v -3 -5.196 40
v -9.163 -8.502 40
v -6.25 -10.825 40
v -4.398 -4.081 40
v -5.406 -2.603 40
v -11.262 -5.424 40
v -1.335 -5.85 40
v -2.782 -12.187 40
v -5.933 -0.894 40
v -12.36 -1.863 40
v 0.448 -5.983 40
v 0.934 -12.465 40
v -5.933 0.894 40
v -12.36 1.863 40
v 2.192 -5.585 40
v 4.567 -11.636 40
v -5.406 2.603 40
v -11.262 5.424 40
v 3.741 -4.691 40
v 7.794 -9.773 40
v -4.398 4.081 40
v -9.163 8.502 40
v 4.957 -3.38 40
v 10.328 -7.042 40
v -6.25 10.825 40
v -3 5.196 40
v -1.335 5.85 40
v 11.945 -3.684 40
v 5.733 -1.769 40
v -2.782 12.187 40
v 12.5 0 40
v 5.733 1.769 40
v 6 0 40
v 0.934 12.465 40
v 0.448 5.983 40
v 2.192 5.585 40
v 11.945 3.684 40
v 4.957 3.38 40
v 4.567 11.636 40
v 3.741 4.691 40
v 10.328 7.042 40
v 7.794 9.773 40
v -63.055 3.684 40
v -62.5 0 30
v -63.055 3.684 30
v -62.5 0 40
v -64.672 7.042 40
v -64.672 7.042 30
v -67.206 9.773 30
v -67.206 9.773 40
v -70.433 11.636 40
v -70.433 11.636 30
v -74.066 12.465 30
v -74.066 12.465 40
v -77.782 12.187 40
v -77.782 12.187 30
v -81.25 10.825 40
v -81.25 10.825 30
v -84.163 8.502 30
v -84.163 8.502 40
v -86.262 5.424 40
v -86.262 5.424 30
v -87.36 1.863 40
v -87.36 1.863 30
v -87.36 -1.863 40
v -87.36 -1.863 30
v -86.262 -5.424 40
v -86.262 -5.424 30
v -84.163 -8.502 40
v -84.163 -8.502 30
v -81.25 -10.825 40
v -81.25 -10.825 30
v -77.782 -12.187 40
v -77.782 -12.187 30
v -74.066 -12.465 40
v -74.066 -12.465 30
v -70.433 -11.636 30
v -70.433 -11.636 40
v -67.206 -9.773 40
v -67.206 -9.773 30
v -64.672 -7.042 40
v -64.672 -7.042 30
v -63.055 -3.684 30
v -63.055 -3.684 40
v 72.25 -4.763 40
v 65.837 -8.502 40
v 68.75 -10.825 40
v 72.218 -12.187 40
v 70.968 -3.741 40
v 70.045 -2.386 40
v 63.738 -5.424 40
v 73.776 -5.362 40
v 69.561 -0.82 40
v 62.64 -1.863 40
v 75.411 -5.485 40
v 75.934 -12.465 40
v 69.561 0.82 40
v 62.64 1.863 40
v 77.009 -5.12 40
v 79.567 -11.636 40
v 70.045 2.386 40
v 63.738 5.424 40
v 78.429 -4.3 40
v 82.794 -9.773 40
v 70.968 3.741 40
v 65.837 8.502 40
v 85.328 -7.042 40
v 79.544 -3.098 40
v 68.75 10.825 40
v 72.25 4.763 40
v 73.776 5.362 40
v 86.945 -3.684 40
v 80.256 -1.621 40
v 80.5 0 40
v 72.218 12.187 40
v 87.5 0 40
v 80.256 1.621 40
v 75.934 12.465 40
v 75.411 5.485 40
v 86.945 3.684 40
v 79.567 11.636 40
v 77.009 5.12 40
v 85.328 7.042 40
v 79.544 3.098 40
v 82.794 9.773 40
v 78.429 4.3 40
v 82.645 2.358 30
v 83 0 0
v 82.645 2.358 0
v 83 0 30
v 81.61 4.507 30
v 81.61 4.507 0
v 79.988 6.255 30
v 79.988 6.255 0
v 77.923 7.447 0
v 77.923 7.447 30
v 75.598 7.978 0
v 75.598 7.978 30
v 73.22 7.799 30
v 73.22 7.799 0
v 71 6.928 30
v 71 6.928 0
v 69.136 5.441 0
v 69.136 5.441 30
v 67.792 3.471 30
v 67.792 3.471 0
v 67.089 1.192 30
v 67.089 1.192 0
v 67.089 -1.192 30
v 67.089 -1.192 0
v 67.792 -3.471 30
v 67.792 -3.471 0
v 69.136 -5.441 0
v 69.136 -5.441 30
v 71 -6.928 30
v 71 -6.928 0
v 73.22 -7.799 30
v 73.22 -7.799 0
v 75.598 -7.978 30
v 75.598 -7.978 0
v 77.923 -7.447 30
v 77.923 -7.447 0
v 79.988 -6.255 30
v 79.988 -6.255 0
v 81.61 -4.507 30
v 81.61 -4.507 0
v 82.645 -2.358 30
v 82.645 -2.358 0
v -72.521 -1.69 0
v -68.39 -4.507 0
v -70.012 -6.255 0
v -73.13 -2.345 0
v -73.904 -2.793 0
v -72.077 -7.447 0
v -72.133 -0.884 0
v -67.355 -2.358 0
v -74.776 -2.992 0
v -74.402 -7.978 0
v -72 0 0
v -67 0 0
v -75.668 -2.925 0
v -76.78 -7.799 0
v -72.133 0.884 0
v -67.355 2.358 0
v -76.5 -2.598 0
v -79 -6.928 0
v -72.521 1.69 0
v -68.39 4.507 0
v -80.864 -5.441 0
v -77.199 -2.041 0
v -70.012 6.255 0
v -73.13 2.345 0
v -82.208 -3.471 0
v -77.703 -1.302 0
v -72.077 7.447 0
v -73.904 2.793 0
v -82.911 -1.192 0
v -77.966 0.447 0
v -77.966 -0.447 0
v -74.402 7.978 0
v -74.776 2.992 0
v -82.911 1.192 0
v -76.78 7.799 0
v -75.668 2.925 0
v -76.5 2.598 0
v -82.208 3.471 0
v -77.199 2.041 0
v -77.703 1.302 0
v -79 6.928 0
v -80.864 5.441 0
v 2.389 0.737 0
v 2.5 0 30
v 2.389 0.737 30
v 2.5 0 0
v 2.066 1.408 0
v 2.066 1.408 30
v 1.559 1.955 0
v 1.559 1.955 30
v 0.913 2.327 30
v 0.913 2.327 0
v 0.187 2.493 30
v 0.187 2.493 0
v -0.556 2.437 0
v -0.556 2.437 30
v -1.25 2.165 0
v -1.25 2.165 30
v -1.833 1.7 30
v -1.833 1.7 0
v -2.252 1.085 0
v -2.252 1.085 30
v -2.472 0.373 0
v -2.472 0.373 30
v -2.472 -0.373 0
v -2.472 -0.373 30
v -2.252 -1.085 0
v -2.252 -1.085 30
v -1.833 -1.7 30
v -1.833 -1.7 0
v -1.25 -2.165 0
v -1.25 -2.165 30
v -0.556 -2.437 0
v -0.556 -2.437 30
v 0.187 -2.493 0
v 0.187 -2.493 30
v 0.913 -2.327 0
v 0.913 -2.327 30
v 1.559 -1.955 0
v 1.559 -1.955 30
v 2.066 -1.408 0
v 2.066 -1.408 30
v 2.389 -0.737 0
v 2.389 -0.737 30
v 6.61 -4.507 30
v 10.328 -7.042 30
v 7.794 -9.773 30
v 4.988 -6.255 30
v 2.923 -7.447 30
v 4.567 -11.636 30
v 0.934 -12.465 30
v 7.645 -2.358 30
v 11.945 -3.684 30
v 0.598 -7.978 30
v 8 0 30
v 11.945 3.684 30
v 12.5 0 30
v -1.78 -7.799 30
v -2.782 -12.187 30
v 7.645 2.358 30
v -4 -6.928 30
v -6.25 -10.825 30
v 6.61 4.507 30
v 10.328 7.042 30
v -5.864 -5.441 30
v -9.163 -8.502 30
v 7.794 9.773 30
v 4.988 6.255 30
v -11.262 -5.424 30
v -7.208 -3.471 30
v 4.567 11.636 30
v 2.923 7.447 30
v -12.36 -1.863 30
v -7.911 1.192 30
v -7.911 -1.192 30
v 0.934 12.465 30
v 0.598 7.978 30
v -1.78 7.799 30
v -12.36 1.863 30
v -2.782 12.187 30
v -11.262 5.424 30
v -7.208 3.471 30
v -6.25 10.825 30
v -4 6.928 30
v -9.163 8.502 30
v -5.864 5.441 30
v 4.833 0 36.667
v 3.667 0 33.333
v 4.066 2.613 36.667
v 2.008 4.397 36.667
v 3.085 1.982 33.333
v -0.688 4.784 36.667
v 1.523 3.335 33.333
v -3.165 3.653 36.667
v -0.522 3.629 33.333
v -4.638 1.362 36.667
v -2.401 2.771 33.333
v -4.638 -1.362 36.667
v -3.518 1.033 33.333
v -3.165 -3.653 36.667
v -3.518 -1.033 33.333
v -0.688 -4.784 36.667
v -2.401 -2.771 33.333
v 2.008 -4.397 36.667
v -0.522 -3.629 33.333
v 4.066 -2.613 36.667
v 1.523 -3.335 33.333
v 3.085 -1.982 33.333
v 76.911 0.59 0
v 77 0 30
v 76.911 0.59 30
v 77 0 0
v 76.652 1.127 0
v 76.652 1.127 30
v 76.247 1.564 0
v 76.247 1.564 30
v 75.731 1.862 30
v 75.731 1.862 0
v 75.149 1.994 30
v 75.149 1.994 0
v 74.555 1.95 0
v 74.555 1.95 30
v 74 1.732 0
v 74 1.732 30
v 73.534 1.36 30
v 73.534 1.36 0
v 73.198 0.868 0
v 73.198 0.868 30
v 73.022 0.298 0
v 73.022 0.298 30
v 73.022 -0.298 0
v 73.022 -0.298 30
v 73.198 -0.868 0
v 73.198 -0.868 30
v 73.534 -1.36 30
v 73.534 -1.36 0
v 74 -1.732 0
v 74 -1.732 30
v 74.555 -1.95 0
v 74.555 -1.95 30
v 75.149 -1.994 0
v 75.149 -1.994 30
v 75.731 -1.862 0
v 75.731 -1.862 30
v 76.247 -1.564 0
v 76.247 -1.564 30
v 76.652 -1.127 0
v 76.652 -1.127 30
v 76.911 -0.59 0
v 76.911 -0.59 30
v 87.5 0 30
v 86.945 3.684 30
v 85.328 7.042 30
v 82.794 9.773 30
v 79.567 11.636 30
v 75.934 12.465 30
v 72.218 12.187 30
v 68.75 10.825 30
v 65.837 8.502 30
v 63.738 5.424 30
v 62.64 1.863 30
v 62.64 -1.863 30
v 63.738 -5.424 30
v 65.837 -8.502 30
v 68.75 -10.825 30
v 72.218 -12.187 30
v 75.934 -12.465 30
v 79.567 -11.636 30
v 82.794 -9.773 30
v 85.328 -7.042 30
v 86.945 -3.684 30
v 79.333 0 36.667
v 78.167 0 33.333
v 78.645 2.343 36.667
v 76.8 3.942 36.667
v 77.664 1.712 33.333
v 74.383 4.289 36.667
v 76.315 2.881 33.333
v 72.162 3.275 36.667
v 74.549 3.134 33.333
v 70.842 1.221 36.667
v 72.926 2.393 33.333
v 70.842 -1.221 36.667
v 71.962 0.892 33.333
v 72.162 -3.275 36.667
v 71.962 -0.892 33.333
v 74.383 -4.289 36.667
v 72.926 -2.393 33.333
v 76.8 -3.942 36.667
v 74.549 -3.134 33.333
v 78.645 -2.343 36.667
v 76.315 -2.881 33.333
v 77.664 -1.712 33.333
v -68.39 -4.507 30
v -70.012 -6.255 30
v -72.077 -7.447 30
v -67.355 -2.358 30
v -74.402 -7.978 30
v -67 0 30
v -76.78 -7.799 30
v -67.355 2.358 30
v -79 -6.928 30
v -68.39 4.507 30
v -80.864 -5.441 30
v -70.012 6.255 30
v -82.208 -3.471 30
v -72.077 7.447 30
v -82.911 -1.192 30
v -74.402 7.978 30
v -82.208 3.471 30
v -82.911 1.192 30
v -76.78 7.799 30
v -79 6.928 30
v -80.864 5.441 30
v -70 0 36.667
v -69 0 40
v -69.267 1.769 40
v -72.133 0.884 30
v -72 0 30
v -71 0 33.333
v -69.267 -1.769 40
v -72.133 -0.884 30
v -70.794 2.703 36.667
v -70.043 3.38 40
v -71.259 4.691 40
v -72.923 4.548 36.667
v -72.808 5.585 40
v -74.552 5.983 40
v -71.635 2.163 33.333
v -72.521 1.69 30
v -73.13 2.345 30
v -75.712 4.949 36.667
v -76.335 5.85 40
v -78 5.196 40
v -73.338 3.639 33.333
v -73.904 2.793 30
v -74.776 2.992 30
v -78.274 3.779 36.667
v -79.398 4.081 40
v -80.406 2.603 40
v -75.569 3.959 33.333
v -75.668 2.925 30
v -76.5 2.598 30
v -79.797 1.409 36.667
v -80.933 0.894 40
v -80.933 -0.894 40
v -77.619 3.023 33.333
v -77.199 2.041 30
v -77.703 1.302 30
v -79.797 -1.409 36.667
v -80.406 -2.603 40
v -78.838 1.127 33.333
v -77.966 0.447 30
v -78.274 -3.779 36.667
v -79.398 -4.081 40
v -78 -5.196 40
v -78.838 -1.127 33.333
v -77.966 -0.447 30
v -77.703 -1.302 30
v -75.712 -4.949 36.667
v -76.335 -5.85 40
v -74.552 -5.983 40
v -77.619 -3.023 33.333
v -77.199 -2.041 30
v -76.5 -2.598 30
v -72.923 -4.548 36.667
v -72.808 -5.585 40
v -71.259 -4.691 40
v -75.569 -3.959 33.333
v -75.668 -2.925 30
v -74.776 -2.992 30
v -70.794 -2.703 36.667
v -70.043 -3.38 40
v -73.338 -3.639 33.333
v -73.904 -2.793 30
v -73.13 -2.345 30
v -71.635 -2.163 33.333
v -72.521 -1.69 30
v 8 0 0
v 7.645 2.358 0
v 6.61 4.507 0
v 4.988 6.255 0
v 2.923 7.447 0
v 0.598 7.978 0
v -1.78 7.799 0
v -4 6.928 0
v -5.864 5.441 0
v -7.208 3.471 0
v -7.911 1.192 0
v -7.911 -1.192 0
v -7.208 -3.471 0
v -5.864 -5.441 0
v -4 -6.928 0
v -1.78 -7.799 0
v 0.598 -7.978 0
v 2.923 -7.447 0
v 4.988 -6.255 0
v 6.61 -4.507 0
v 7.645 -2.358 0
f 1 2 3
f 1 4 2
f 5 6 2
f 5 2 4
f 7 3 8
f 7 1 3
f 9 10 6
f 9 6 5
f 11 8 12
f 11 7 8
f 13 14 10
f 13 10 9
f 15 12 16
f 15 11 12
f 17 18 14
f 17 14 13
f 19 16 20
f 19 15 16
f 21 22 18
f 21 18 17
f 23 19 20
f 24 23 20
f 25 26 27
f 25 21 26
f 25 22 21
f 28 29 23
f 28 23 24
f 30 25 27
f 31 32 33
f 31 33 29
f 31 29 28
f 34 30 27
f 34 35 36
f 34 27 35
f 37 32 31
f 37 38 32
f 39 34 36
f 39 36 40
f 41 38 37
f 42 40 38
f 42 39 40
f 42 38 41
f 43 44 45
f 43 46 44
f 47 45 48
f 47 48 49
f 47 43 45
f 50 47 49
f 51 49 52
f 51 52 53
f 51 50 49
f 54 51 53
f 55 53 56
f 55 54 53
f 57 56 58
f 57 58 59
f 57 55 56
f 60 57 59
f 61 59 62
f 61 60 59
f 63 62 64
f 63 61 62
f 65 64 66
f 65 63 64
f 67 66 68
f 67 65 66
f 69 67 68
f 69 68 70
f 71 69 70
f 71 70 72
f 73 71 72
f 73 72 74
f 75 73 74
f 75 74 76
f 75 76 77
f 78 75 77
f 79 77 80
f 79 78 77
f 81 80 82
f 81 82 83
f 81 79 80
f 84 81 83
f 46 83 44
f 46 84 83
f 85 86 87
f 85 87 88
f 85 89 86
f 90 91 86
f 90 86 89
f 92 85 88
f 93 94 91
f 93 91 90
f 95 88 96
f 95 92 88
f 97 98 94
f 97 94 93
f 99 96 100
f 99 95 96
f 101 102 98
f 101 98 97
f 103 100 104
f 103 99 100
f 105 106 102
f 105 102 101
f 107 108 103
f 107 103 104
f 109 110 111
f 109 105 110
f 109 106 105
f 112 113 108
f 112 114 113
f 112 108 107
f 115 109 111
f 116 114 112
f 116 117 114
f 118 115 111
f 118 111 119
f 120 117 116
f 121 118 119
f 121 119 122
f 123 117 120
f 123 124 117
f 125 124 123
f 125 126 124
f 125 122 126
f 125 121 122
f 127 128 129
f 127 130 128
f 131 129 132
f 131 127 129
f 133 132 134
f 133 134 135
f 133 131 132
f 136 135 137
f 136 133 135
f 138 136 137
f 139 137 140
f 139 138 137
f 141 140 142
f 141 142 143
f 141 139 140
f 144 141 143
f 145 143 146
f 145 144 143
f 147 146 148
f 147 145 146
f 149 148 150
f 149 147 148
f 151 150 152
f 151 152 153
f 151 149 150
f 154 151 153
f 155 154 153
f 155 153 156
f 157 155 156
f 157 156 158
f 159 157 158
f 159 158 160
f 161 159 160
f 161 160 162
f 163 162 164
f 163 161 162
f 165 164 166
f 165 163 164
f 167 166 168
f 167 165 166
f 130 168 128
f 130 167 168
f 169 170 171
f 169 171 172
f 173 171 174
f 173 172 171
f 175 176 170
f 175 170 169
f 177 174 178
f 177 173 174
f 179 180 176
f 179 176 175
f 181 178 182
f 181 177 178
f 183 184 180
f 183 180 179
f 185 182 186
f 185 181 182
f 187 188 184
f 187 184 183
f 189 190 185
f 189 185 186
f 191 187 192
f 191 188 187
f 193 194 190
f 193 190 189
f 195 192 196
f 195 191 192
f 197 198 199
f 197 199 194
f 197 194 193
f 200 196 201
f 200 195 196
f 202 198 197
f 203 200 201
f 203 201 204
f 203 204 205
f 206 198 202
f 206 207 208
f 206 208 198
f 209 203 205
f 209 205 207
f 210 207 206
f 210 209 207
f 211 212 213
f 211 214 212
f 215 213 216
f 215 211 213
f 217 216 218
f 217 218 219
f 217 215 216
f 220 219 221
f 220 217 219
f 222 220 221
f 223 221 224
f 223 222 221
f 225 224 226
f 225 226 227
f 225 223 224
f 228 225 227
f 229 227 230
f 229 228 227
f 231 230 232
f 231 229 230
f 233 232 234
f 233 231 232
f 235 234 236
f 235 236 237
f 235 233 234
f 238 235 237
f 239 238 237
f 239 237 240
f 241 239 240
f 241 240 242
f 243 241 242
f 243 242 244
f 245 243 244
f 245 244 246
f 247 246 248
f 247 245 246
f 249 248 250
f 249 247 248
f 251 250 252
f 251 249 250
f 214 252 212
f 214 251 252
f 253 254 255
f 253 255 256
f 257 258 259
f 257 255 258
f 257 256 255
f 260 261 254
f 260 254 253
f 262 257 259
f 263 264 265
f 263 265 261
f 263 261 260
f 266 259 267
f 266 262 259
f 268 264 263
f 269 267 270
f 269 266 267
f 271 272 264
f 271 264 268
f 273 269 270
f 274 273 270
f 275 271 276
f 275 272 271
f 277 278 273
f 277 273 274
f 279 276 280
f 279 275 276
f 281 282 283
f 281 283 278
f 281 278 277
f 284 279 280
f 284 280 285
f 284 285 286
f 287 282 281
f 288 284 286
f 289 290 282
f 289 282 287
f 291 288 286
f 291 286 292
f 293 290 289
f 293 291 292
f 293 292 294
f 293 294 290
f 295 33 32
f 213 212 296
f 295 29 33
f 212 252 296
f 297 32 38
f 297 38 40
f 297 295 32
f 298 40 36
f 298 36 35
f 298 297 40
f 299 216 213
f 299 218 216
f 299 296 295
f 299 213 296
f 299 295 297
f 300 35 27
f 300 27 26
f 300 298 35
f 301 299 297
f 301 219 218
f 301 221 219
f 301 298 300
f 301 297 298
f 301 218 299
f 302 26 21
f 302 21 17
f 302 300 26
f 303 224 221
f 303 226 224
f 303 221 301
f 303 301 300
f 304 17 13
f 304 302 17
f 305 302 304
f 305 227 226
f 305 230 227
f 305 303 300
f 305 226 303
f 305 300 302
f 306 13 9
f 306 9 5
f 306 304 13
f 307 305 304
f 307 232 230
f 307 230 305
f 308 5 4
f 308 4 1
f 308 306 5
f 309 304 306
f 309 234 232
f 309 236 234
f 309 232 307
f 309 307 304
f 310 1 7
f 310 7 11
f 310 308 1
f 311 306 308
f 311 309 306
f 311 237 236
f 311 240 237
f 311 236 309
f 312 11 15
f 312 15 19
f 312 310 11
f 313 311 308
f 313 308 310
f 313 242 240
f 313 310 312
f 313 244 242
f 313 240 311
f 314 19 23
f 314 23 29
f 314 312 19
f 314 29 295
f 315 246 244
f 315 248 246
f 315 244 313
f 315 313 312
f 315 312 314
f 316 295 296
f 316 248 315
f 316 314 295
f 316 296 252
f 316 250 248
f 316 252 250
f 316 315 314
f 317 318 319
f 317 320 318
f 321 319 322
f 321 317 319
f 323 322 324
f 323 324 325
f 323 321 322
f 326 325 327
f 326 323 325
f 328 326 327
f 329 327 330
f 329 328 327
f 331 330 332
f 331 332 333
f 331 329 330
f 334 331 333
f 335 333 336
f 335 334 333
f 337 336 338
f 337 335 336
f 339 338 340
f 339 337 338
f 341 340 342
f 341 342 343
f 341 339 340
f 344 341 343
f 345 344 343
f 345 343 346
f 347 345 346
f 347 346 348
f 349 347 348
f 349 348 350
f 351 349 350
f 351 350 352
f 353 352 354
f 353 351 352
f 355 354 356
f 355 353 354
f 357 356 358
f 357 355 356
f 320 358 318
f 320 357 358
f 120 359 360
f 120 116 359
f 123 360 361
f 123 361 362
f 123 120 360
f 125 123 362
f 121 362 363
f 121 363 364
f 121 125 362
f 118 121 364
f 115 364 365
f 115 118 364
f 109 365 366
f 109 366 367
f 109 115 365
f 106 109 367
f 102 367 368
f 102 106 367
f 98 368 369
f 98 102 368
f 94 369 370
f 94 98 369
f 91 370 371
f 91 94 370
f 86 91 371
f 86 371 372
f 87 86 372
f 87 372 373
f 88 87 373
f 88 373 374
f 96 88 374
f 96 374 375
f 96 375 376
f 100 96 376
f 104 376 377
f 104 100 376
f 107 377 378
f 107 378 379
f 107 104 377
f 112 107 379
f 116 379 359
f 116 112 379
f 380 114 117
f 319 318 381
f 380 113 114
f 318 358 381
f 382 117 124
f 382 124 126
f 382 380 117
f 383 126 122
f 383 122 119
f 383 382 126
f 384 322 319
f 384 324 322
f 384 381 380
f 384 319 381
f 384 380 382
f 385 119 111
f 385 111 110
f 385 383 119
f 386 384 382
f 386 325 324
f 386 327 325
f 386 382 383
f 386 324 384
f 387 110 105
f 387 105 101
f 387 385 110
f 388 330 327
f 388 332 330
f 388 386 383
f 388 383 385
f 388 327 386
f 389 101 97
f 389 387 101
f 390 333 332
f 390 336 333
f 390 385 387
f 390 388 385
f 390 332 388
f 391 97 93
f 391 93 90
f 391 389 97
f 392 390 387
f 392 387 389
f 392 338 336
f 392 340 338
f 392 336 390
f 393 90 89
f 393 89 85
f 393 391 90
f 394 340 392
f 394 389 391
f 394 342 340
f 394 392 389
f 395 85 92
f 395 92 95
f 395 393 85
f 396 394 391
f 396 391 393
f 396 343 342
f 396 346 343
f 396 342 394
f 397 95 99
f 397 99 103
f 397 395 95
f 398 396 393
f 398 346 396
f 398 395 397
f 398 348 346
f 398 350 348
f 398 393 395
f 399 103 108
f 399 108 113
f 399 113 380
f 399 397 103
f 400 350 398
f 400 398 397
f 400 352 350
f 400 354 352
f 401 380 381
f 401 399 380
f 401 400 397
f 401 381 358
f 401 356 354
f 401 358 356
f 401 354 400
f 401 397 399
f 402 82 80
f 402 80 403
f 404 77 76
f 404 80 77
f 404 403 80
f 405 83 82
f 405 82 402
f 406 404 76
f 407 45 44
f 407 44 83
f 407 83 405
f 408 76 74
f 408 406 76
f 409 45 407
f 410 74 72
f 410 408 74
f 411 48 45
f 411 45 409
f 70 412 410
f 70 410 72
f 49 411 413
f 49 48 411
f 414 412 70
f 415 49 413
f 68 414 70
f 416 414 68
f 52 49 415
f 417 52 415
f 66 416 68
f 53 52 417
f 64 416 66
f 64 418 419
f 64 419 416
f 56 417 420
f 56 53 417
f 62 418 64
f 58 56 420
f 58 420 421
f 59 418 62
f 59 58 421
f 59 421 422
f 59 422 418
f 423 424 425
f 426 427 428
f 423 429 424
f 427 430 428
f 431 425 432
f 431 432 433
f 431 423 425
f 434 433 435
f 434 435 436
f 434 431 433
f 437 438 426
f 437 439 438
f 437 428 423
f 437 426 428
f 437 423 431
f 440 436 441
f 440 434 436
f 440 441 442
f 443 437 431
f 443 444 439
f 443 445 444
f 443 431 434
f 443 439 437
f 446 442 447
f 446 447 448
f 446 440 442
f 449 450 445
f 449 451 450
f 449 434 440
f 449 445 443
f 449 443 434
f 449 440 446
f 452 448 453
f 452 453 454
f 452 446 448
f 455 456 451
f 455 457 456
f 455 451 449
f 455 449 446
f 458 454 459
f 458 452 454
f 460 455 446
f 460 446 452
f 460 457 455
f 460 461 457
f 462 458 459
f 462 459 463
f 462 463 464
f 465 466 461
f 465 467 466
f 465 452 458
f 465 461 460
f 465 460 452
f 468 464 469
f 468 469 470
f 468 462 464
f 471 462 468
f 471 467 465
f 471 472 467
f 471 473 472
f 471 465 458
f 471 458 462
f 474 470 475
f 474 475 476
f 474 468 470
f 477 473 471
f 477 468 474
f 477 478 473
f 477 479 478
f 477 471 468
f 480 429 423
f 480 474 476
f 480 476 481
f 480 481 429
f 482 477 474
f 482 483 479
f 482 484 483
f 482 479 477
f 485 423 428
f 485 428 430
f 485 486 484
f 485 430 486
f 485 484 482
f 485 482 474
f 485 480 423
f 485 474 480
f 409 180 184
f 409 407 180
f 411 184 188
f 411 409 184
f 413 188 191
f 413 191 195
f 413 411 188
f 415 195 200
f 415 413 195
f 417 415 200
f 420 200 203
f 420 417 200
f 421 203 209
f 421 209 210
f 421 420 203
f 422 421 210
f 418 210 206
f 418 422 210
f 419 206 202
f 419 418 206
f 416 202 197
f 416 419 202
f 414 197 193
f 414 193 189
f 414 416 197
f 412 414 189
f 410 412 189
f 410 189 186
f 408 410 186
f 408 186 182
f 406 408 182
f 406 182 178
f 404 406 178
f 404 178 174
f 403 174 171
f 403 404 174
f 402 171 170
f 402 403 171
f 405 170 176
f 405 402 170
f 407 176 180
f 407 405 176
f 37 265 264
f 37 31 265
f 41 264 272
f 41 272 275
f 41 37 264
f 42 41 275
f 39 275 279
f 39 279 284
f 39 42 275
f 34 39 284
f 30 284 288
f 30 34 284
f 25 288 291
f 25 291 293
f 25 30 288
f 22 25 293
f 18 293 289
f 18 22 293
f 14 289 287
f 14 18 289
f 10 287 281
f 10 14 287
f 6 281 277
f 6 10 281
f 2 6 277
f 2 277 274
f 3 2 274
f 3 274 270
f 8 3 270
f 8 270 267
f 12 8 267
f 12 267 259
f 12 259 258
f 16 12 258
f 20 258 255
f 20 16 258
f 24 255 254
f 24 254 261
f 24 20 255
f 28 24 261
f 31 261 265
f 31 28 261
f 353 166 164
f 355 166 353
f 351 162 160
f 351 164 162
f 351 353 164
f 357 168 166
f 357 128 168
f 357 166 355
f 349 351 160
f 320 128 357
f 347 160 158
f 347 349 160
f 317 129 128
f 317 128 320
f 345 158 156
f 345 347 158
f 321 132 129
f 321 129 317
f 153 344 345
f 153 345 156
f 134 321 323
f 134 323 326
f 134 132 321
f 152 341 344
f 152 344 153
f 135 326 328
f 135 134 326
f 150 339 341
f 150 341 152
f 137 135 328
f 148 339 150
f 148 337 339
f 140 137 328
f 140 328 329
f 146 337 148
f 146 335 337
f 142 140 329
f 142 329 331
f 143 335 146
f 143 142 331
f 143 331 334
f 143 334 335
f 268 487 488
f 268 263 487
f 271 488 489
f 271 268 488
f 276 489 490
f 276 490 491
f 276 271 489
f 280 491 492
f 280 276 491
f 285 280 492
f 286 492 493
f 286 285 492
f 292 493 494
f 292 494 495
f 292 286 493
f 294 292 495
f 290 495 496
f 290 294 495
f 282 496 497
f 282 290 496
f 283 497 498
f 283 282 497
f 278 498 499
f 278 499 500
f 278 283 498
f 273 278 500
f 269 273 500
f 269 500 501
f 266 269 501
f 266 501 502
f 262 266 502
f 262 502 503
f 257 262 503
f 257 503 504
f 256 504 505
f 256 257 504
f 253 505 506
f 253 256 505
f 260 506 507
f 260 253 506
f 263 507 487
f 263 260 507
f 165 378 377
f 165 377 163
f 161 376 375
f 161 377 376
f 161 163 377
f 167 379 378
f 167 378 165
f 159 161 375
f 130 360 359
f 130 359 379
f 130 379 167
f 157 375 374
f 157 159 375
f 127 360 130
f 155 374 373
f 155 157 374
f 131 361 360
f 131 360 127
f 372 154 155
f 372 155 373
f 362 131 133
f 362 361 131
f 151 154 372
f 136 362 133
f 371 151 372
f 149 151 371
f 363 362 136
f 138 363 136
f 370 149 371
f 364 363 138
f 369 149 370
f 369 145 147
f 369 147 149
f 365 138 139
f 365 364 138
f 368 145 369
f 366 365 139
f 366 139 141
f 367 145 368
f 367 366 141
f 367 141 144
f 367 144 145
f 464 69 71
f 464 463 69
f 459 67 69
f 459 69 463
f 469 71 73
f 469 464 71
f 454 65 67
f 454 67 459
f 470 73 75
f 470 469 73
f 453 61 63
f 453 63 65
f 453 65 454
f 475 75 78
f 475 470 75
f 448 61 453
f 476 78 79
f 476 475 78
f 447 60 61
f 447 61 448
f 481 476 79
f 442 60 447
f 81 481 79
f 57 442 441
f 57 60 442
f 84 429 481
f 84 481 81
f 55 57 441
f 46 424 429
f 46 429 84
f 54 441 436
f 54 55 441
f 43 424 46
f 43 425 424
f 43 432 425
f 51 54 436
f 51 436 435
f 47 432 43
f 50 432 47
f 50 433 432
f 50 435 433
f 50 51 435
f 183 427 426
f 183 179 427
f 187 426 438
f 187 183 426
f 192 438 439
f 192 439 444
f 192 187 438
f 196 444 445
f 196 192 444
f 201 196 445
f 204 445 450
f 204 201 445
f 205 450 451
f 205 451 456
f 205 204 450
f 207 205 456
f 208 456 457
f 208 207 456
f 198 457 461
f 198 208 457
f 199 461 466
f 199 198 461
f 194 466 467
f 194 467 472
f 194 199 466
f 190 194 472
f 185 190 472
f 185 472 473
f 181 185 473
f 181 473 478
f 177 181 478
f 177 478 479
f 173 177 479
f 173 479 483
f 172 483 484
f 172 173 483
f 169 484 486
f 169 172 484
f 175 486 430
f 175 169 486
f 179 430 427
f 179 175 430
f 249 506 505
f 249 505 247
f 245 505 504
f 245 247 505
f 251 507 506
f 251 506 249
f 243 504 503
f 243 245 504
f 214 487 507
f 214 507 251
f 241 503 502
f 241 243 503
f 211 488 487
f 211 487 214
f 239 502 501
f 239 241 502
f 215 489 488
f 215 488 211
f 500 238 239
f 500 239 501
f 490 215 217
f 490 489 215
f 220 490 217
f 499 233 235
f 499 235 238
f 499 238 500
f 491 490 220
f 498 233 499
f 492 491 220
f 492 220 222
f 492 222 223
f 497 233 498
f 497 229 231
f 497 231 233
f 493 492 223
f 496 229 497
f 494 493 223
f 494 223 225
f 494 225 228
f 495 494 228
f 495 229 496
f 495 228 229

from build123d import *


with BuildPart() as f1:
    # F0 (on Front) → F1 (revolve)
    with BuildSketch(Plane.XZ):
        Polygon((2.5, 0), (8, 0), (8, 30), (12.5, 30), (12.5, 40), (6, 40), (2.5, 30), align=None)
    revolve(axis=Axis((0, 0, 24.445264), (0, 0, 1)))


with BuildPart() as f3:
    # F2 (on Front) → F3 (revolve)
    with BuildSketch(Plane.XZ):
        Polygon((77, 0), (83, 0), (83, 30), (87.5, 30), (87.5, 40), (80.5, 40), (77, 30), align=None)
    revolve(axis=Axis((75, 0, 24.051853), (0, 0, 1)))


with BuildPart() as f5:
    # F4 (on Front) → F5 (revolve)
    with BuildSketch(Plane.XZ):
        Polygon((-72, 0), (-67, 0), (-67, 30), (-62.5, 30), (-62.5, 40), (-69, 40), (-72, 30), align=None)
    revolve(axis=Axis((-75, 0, 24.515344), (0, 0, 1)))


solid = Compound([f1.part, f3.part, f5.part])
